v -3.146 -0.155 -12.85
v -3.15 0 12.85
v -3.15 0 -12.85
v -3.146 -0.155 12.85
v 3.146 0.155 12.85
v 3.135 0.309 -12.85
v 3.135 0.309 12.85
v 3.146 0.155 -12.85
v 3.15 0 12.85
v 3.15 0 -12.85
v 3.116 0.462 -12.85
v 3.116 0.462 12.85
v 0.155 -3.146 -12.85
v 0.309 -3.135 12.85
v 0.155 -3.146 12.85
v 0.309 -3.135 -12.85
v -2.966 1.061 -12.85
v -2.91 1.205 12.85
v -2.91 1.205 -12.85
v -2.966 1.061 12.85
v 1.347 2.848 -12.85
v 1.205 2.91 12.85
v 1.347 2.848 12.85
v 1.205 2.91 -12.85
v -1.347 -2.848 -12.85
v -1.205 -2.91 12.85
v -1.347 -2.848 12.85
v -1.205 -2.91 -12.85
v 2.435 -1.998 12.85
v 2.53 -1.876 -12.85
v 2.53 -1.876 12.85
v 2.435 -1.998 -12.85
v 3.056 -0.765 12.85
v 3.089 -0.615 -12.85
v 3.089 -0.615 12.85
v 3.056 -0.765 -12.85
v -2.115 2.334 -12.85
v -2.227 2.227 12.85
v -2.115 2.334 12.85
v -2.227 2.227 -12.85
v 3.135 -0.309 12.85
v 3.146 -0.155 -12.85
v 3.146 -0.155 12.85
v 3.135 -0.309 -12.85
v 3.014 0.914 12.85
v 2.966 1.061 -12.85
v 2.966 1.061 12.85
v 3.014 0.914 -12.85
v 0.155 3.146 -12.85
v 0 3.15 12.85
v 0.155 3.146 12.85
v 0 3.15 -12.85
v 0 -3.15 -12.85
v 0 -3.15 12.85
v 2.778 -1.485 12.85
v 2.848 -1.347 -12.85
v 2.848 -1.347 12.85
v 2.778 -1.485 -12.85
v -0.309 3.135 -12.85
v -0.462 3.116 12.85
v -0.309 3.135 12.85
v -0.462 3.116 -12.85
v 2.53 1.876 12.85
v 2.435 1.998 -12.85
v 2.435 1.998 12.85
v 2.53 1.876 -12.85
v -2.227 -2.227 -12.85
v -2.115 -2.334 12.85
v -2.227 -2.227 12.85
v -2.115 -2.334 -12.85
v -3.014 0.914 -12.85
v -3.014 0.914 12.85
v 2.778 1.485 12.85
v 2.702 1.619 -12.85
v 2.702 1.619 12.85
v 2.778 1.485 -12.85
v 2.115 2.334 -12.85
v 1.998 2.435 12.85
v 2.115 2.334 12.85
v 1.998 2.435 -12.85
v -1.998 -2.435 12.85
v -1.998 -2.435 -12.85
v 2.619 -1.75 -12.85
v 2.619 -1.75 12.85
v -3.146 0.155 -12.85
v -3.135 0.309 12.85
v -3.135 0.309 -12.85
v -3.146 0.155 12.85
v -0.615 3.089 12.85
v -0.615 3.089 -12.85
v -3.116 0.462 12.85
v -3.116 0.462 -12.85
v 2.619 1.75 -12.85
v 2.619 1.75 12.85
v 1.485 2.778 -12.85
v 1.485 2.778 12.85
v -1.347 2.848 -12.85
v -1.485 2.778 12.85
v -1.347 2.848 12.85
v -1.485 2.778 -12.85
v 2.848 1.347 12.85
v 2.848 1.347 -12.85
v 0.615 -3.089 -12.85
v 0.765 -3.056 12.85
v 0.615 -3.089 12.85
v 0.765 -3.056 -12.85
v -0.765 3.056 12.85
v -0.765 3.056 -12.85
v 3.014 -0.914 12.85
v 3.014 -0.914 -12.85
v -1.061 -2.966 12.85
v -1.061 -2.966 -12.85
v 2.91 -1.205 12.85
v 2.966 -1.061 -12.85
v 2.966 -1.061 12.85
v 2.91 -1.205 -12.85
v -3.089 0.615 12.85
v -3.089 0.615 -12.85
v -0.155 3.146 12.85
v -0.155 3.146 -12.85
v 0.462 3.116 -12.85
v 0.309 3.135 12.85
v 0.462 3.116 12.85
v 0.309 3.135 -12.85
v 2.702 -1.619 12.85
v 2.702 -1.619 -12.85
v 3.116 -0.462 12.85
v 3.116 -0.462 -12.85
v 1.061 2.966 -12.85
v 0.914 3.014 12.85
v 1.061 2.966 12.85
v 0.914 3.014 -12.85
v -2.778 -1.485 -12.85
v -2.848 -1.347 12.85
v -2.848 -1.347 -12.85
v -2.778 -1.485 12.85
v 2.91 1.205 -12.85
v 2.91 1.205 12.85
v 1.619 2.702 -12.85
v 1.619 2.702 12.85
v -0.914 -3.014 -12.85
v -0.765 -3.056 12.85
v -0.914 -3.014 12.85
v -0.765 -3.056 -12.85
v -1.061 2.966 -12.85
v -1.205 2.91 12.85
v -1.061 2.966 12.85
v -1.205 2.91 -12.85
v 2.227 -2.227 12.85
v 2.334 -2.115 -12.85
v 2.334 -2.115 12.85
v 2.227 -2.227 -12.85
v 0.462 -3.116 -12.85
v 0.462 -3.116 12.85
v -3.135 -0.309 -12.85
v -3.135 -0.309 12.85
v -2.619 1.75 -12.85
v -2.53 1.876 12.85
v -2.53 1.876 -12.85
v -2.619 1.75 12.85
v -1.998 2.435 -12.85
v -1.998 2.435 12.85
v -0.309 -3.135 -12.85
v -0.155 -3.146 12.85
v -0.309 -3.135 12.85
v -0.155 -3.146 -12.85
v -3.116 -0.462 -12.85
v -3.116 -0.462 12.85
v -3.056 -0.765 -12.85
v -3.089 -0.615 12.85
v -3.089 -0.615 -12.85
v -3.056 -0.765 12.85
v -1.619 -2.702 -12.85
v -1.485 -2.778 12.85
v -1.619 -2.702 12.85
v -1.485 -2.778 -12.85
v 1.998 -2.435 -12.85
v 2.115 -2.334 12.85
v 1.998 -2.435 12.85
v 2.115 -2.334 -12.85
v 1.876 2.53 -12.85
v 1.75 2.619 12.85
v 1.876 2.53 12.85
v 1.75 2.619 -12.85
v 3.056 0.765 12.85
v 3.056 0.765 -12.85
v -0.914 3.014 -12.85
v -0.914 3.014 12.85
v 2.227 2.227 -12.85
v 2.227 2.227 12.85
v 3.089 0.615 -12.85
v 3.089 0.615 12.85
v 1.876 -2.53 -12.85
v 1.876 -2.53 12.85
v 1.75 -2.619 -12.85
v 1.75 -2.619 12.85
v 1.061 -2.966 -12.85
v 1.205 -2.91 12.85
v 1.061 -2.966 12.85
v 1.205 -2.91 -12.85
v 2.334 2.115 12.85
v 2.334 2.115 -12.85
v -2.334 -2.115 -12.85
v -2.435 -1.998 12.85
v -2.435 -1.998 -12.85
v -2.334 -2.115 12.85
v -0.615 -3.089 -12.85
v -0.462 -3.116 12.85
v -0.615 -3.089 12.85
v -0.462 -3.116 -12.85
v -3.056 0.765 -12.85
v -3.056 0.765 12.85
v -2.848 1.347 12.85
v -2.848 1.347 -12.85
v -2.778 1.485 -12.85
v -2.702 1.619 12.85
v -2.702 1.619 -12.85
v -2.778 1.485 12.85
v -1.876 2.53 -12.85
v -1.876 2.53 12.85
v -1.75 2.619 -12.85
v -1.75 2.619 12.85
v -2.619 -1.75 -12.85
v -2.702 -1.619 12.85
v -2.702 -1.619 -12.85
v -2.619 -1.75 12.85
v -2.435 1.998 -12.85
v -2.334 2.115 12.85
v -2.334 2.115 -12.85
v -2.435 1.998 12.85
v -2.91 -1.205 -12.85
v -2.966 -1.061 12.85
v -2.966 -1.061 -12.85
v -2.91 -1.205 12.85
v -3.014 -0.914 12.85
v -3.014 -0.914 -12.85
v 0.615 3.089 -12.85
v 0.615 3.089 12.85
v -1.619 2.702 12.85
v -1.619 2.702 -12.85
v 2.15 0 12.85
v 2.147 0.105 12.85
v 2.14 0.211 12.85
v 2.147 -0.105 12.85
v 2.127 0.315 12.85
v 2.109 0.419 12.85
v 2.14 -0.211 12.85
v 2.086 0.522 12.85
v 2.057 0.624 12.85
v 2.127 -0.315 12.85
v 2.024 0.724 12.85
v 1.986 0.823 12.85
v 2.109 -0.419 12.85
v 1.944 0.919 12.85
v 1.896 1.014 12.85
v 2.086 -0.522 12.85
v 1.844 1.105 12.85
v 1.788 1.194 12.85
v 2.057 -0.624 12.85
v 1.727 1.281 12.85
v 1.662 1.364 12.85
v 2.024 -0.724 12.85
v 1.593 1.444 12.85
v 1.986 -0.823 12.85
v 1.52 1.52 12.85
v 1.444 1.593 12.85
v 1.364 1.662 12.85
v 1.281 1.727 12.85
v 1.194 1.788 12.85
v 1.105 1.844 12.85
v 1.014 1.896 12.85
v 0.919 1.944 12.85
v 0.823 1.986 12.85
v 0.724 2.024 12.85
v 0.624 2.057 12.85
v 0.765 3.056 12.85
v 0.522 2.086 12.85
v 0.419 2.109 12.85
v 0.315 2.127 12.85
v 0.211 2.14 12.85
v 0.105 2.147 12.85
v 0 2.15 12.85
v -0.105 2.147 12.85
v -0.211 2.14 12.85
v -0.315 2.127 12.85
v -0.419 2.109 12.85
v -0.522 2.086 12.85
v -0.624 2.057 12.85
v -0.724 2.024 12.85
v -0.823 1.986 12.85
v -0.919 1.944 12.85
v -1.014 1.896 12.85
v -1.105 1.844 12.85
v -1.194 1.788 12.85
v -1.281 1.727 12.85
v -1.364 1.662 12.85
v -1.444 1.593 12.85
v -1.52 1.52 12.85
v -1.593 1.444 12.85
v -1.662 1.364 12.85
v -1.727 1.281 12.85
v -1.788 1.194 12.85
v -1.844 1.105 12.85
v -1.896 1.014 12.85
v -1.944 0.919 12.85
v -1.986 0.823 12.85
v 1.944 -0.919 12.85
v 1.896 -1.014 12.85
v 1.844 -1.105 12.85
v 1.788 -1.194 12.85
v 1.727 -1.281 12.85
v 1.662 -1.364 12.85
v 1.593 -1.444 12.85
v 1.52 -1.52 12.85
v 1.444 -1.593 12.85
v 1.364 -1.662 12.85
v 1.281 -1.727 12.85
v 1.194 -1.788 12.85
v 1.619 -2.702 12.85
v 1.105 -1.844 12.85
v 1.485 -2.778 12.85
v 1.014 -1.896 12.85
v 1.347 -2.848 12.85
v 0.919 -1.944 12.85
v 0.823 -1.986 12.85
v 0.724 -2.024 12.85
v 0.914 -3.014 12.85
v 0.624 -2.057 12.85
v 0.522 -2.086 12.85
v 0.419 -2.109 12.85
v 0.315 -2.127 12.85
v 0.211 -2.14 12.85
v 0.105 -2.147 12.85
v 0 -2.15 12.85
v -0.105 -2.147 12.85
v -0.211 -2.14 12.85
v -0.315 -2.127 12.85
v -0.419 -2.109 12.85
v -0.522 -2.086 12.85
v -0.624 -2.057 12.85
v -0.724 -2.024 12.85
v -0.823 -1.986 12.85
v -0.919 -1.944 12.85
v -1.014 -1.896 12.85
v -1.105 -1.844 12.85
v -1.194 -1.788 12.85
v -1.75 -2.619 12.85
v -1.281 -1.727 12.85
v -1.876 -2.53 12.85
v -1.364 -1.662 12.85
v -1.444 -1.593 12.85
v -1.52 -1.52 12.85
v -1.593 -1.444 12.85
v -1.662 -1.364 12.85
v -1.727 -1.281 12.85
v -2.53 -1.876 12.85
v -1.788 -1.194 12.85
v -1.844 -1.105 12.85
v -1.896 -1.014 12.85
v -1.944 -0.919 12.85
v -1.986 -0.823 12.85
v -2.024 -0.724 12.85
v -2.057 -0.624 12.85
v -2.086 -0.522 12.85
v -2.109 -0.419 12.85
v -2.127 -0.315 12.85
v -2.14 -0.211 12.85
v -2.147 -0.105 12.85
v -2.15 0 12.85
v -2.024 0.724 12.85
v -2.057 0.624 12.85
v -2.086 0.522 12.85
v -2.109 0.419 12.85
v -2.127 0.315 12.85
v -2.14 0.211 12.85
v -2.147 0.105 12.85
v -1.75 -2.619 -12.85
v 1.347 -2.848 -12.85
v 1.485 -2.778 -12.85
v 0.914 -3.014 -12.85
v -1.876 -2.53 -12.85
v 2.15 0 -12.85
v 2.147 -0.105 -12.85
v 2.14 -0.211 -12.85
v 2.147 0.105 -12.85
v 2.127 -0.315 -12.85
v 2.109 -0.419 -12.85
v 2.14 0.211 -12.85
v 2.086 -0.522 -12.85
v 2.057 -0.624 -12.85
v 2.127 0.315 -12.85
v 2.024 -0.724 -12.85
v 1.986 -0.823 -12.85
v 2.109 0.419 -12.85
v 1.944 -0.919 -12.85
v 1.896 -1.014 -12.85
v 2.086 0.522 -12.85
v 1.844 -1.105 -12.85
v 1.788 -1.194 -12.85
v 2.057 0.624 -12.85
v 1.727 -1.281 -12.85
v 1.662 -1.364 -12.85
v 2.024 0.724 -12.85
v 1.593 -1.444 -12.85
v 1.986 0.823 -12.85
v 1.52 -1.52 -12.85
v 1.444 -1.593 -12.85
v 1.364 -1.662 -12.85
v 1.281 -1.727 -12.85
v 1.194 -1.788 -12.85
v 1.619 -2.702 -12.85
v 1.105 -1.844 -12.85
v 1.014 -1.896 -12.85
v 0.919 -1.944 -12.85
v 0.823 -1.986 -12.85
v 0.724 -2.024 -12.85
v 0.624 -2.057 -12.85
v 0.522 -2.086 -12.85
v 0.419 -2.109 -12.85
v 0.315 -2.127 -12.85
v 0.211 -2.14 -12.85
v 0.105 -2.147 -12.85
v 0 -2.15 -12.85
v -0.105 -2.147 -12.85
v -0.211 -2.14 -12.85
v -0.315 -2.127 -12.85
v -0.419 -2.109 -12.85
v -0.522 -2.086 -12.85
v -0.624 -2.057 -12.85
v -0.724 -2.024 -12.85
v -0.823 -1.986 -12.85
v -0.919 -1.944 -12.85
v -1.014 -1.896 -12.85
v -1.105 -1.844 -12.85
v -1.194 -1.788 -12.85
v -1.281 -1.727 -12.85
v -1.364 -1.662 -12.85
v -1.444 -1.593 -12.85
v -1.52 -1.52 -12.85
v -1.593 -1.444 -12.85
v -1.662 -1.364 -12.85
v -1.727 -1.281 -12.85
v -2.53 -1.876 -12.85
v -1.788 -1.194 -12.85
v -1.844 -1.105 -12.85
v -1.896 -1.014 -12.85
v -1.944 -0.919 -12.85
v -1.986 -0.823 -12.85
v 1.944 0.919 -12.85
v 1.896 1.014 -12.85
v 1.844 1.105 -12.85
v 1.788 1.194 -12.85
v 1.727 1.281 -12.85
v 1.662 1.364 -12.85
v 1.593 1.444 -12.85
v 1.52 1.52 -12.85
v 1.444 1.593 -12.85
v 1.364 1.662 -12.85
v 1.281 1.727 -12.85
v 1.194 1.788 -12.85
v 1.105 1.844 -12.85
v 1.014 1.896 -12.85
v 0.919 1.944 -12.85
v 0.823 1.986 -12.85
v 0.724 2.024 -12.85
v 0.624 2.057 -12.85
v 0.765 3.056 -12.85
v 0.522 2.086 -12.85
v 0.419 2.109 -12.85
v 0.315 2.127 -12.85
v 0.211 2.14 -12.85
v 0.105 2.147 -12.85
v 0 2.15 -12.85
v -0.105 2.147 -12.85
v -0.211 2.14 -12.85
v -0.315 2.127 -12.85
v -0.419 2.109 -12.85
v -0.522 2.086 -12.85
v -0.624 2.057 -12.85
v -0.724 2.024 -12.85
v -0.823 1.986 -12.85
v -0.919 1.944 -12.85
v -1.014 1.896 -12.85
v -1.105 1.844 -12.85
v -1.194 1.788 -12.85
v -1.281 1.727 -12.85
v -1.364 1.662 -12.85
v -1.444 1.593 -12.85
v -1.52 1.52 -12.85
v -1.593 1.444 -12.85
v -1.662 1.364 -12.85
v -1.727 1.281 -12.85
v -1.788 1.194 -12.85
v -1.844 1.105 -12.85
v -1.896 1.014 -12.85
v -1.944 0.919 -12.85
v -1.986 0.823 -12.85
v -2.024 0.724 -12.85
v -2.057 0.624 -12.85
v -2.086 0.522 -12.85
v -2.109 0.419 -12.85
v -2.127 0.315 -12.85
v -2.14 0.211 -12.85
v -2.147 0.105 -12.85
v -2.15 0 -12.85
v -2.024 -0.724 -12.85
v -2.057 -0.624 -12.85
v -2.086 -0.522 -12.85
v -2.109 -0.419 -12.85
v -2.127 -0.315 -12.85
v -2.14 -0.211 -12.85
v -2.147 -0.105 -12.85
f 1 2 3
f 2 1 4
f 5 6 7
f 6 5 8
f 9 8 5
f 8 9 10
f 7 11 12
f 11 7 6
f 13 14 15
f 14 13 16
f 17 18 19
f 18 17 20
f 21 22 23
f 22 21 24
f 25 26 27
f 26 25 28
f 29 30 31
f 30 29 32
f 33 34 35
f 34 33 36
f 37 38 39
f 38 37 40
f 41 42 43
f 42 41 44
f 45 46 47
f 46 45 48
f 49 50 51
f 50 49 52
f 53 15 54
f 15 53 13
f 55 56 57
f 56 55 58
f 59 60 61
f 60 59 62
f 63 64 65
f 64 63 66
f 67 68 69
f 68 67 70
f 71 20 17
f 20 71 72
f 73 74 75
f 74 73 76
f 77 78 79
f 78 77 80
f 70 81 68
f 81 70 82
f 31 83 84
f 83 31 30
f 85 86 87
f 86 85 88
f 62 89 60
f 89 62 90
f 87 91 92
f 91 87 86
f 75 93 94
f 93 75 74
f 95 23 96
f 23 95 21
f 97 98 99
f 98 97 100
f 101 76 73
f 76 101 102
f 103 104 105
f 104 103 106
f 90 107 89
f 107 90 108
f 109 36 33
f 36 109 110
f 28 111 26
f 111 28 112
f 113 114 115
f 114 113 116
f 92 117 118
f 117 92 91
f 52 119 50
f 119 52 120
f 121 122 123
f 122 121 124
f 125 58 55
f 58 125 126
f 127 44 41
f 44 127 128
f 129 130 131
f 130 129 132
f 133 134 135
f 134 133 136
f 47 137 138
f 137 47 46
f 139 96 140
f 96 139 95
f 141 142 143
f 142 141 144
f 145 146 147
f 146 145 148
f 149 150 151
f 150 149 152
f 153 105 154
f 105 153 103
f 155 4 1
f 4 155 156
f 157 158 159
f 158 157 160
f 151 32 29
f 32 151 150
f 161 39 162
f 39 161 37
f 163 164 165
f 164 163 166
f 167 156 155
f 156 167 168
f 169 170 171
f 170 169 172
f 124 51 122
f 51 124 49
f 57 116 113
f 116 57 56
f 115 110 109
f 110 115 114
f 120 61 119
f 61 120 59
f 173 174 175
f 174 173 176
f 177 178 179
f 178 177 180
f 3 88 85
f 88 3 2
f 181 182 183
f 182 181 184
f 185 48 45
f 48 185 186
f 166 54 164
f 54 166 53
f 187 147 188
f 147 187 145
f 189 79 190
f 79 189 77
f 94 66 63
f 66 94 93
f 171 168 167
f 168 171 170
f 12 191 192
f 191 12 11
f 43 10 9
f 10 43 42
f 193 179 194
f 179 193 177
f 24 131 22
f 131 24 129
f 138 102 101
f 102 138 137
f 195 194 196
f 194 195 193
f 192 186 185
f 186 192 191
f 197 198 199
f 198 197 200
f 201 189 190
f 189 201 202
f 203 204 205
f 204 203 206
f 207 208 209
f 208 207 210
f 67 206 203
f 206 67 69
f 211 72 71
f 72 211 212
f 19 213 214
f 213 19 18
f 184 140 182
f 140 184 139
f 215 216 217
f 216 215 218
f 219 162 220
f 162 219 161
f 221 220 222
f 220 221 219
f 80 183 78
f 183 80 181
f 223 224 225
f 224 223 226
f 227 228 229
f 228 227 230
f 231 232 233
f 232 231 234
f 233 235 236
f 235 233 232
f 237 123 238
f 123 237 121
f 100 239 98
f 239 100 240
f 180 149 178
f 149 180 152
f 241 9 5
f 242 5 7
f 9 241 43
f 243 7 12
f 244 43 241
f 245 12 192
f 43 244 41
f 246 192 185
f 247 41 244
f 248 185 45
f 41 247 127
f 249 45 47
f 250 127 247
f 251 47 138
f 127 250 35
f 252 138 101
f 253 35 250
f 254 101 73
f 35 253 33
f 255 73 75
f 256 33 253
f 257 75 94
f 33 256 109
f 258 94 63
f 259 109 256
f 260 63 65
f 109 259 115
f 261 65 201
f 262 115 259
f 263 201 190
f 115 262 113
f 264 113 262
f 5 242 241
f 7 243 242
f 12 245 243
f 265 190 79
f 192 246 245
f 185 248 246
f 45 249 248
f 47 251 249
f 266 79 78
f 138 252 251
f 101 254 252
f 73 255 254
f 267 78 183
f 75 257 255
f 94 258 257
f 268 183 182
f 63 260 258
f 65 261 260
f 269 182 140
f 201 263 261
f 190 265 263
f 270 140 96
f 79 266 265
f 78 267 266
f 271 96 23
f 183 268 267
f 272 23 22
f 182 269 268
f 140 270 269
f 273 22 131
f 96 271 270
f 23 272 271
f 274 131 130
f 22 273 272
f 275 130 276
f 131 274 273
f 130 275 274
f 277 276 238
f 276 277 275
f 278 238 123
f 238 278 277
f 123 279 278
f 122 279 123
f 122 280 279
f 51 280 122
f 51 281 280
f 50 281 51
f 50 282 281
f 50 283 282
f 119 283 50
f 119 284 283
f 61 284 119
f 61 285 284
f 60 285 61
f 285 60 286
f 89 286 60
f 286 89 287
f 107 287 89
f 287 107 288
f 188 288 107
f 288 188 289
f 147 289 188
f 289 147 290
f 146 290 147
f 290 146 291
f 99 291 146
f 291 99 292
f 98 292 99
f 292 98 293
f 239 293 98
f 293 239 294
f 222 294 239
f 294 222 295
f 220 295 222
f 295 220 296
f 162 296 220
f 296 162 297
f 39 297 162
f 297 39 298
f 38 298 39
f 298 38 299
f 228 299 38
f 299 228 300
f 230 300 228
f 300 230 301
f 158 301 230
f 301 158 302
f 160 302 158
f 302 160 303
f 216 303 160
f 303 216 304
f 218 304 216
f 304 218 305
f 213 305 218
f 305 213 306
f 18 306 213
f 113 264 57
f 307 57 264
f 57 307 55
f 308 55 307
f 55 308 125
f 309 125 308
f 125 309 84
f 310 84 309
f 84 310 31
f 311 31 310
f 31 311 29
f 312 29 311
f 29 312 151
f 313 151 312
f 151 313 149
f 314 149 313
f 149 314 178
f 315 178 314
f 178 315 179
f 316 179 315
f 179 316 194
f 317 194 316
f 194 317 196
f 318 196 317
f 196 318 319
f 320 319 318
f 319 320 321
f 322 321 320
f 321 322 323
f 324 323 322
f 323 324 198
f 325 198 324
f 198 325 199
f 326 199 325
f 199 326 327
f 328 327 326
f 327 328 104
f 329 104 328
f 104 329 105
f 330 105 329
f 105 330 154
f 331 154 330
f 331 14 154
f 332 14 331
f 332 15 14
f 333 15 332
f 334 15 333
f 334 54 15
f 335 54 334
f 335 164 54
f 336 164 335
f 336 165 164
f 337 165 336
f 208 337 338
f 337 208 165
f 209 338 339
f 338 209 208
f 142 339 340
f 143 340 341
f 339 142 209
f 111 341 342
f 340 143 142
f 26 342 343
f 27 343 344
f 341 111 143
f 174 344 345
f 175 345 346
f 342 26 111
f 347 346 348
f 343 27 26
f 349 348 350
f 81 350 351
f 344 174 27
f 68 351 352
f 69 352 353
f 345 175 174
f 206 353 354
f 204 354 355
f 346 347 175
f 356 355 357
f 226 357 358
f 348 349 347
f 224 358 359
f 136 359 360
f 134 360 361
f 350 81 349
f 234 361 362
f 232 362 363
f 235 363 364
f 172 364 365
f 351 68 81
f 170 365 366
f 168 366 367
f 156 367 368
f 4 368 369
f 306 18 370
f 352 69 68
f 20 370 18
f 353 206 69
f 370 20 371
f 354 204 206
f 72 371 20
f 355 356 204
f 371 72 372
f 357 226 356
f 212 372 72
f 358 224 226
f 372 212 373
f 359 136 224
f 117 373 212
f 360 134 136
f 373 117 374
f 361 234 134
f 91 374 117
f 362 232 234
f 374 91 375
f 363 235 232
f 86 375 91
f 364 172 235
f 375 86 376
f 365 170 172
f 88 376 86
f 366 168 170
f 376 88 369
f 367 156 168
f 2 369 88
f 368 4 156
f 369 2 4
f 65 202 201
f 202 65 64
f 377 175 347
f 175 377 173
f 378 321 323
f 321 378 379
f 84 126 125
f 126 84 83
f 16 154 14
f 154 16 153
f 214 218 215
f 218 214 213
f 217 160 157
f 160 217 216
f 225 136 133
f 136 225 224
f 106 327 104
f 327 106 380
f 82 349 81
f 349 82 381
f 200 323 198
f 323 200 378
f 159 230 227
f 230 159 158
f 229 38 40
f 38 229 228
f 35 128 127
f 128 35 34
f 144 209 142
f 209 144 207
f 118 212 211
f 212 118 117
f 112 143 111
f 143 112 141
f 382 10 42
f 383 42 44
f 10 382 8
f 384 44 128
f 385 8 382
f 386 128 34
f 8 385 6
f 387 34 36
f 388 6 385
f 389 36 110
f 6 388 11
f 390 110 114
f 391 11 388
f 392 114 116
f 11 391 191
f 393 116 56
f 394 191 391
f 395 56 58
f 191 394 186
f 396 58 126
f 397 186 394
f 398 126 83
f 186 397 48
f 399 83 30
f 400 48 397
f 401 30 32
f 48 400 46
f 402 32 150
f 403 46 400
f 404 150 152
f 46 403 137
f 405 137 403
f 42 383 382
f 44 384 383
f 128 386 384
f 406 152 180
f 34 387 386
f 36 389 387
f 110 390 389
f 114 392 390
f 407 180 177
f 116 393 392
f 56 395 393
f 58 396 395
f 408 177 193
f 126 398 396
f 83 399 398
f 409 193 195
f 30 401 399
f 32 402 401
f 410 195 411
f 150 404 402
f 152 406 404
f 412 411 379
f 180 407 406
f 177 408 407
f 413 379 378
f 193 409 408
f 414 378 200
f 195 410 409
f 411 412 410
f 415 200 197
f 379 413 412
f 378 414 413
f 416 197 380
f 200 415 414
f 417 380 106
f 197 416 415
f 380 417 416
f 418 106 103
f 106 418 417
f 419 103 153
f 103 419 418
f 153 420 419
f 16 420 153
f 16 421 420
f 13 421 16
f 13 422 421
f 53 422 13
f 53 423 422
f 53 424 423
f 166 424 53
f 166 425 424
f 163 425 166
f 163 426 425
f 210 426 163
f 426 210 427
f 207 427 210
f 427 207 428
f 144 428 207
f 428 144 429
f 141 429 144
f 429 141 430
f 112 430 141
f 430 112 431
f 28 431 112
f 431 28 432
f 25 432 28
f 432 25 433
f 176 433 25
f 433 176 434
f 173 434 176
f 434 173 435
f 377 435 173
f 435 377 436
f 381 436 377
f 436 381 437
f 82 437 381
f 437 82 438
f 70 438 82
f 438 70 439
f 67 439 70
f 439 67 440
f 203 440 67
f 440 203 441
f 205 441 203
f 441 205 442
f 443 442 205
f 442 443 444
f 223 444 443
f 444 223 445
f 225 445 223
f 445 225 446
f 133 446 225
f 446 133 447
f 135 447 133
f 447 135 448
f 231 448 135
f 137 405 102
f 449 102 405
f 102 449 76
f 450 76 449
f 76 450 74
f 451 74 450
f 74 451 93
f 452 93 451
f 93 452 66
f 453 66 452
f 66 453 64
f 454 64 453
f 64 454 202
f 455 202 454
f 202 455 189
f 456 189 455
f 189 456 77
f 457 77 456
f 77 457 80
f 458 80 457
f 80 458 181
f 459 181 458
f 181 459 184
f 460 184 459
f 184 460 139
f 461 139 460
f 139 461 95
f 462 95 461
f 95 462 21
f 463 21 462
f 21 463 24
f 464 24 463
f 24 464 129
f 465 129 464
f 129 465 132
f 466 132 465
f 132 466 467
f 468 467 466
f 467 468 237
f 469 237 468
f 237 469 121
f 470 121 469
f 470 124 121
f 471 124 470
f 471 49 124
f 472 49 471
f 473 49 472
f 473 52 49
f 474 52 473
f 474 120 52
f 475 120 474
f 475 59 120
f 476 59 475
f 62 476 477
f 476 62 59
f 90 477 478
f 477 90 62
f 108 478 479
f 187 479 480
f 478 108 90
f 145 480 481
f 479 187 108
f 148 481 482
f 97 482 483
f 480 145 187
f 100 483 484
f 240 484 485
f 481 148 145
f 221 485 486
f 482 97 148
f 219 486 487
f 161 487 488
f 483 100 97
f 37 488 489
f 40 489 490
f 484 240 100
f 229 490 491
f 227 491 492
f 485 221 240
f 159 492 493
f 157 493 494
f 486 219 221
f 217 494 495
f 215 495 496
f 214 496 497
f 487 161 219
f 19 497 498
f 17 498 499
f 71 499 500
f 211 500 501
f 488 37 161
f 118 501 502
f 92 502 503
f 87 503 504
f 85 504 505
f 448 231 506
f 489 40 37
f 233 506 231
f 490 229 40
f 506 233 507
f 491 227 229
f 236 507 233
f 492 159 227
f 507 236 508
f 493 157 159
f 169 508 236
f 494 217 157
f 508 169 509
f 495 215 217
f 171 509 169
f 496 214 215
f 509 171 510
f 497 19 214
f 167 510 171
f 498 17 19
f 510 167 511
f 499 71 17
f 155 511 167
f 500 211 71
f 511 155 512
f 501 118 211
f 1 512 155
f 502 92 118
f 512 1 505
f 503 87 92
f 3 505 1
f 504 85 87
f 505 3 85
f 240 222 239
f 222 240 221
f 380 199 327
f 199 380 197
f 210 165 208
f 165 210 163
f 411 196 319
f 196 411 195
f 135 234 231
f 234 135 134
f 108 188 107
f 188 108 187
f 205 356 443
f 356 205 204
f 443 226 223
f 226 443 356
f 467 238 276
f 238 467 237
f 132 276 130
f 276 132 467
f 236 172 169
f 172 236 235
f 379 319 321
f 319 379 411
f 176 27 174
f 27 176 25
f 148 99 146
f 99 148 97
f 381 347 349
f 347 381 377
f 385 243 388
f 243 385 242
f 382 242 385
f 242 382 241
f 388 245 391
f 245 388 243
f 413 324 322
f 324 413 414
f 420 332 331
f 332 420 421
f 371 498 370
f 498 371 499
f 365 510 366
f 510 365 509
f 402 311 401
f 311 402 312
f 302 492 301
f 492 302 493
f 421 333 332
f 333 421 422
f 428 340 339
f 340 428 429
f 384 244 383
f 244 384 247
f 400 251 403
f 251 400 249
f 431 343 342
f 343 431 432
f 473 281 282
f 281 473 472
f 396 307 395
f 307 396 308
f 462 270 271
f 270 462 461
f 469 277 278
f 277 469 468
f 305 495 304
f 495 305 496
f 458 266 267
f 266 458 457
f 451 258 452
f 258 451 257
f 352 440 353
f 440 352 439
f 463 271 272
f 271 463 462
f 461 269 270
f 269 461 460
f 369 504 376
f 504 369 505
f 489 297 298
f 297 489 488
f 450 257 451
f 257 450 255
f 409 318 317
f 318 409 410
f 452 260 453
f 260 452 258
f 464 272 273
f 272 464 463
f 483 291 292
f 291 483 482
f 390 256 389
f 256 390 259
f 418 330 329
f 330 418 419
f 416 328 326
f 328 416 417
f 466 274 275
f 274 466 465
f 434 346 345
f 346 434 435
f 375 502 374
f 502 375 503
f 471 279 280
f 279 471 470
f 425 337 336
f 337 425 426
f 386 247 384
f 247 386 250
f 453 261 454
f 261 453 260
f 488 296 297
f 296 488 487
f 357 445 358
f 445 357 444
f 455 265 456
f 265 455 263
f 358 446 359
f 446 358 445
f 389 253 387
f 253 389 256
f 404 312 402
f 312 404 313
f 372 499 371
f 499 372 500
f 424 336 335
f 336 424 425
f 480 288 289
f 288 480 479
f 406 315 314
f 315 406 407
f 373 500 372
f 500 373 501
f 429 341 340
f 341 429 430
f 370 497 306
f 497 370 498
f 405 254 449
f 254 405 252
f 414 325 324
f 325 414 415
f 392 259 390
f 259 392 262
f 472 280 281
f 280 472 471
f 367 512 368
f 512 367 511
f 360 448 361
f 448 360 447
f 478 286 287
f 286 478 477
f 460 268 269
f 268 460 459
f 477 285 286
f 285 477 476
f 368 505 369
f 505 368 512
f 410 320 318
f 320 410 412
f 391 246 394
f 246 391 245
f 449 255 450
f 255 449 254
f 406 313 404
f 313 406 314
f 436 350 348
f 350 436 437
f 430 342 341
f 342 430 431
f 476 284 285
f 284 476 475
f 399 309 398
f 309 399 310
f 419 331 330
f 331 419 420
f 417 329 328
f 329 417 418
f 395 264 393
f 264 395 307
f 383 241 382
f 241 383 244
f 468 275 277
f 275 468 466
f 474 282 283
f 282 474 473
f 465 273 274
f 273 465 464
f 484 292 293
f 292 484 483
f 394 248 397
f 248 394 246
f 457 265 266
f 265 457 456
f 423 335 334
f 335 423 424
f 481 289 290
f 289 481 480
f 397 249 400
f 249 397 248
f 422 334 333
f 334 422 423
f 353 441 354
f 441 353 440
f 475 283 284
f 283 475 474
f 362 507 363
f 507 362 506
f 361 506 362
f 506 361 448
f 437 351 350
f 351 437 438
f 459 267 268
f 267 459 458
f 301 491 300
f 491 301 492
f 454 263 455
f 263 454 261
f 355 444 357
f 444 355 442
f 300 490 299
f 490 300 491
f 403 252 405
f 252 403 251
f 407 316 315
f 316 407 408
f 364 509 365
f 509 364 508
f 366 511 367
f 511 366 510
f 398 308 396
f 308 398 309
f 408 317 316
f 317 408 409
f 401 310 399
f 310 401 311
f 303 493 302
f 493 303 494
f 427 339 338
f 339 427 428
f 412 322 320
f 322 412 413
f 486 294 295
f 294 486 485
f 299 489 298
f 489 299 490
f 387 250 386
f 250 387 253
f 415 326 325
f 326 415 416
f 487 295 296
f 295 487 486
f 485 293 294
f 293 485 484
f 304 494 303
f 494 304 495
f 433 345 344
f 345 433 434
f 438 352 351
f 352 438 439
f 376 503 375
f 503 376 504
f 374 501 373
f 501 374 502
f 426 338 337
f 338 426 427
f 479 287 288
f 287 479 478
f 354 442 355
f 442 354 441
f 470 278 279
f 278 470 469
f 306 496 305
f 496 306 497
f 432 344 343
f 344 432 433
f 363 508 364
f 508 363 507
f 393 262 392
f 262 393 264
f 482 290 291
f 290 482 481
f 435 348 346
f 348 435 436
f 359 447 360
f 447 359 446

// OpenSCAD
$fn=128;

od = 6.3;
h  = 25.7;
wall = 1.0;
id = od - 2*wall;

module sleeve(od, id, h){
    difference(){
        cylinder(d=od, h=h, center=true);
        cylinder(d=id, h=h+0.2, center=true);
    }
}

sleeve(od, id, h);
